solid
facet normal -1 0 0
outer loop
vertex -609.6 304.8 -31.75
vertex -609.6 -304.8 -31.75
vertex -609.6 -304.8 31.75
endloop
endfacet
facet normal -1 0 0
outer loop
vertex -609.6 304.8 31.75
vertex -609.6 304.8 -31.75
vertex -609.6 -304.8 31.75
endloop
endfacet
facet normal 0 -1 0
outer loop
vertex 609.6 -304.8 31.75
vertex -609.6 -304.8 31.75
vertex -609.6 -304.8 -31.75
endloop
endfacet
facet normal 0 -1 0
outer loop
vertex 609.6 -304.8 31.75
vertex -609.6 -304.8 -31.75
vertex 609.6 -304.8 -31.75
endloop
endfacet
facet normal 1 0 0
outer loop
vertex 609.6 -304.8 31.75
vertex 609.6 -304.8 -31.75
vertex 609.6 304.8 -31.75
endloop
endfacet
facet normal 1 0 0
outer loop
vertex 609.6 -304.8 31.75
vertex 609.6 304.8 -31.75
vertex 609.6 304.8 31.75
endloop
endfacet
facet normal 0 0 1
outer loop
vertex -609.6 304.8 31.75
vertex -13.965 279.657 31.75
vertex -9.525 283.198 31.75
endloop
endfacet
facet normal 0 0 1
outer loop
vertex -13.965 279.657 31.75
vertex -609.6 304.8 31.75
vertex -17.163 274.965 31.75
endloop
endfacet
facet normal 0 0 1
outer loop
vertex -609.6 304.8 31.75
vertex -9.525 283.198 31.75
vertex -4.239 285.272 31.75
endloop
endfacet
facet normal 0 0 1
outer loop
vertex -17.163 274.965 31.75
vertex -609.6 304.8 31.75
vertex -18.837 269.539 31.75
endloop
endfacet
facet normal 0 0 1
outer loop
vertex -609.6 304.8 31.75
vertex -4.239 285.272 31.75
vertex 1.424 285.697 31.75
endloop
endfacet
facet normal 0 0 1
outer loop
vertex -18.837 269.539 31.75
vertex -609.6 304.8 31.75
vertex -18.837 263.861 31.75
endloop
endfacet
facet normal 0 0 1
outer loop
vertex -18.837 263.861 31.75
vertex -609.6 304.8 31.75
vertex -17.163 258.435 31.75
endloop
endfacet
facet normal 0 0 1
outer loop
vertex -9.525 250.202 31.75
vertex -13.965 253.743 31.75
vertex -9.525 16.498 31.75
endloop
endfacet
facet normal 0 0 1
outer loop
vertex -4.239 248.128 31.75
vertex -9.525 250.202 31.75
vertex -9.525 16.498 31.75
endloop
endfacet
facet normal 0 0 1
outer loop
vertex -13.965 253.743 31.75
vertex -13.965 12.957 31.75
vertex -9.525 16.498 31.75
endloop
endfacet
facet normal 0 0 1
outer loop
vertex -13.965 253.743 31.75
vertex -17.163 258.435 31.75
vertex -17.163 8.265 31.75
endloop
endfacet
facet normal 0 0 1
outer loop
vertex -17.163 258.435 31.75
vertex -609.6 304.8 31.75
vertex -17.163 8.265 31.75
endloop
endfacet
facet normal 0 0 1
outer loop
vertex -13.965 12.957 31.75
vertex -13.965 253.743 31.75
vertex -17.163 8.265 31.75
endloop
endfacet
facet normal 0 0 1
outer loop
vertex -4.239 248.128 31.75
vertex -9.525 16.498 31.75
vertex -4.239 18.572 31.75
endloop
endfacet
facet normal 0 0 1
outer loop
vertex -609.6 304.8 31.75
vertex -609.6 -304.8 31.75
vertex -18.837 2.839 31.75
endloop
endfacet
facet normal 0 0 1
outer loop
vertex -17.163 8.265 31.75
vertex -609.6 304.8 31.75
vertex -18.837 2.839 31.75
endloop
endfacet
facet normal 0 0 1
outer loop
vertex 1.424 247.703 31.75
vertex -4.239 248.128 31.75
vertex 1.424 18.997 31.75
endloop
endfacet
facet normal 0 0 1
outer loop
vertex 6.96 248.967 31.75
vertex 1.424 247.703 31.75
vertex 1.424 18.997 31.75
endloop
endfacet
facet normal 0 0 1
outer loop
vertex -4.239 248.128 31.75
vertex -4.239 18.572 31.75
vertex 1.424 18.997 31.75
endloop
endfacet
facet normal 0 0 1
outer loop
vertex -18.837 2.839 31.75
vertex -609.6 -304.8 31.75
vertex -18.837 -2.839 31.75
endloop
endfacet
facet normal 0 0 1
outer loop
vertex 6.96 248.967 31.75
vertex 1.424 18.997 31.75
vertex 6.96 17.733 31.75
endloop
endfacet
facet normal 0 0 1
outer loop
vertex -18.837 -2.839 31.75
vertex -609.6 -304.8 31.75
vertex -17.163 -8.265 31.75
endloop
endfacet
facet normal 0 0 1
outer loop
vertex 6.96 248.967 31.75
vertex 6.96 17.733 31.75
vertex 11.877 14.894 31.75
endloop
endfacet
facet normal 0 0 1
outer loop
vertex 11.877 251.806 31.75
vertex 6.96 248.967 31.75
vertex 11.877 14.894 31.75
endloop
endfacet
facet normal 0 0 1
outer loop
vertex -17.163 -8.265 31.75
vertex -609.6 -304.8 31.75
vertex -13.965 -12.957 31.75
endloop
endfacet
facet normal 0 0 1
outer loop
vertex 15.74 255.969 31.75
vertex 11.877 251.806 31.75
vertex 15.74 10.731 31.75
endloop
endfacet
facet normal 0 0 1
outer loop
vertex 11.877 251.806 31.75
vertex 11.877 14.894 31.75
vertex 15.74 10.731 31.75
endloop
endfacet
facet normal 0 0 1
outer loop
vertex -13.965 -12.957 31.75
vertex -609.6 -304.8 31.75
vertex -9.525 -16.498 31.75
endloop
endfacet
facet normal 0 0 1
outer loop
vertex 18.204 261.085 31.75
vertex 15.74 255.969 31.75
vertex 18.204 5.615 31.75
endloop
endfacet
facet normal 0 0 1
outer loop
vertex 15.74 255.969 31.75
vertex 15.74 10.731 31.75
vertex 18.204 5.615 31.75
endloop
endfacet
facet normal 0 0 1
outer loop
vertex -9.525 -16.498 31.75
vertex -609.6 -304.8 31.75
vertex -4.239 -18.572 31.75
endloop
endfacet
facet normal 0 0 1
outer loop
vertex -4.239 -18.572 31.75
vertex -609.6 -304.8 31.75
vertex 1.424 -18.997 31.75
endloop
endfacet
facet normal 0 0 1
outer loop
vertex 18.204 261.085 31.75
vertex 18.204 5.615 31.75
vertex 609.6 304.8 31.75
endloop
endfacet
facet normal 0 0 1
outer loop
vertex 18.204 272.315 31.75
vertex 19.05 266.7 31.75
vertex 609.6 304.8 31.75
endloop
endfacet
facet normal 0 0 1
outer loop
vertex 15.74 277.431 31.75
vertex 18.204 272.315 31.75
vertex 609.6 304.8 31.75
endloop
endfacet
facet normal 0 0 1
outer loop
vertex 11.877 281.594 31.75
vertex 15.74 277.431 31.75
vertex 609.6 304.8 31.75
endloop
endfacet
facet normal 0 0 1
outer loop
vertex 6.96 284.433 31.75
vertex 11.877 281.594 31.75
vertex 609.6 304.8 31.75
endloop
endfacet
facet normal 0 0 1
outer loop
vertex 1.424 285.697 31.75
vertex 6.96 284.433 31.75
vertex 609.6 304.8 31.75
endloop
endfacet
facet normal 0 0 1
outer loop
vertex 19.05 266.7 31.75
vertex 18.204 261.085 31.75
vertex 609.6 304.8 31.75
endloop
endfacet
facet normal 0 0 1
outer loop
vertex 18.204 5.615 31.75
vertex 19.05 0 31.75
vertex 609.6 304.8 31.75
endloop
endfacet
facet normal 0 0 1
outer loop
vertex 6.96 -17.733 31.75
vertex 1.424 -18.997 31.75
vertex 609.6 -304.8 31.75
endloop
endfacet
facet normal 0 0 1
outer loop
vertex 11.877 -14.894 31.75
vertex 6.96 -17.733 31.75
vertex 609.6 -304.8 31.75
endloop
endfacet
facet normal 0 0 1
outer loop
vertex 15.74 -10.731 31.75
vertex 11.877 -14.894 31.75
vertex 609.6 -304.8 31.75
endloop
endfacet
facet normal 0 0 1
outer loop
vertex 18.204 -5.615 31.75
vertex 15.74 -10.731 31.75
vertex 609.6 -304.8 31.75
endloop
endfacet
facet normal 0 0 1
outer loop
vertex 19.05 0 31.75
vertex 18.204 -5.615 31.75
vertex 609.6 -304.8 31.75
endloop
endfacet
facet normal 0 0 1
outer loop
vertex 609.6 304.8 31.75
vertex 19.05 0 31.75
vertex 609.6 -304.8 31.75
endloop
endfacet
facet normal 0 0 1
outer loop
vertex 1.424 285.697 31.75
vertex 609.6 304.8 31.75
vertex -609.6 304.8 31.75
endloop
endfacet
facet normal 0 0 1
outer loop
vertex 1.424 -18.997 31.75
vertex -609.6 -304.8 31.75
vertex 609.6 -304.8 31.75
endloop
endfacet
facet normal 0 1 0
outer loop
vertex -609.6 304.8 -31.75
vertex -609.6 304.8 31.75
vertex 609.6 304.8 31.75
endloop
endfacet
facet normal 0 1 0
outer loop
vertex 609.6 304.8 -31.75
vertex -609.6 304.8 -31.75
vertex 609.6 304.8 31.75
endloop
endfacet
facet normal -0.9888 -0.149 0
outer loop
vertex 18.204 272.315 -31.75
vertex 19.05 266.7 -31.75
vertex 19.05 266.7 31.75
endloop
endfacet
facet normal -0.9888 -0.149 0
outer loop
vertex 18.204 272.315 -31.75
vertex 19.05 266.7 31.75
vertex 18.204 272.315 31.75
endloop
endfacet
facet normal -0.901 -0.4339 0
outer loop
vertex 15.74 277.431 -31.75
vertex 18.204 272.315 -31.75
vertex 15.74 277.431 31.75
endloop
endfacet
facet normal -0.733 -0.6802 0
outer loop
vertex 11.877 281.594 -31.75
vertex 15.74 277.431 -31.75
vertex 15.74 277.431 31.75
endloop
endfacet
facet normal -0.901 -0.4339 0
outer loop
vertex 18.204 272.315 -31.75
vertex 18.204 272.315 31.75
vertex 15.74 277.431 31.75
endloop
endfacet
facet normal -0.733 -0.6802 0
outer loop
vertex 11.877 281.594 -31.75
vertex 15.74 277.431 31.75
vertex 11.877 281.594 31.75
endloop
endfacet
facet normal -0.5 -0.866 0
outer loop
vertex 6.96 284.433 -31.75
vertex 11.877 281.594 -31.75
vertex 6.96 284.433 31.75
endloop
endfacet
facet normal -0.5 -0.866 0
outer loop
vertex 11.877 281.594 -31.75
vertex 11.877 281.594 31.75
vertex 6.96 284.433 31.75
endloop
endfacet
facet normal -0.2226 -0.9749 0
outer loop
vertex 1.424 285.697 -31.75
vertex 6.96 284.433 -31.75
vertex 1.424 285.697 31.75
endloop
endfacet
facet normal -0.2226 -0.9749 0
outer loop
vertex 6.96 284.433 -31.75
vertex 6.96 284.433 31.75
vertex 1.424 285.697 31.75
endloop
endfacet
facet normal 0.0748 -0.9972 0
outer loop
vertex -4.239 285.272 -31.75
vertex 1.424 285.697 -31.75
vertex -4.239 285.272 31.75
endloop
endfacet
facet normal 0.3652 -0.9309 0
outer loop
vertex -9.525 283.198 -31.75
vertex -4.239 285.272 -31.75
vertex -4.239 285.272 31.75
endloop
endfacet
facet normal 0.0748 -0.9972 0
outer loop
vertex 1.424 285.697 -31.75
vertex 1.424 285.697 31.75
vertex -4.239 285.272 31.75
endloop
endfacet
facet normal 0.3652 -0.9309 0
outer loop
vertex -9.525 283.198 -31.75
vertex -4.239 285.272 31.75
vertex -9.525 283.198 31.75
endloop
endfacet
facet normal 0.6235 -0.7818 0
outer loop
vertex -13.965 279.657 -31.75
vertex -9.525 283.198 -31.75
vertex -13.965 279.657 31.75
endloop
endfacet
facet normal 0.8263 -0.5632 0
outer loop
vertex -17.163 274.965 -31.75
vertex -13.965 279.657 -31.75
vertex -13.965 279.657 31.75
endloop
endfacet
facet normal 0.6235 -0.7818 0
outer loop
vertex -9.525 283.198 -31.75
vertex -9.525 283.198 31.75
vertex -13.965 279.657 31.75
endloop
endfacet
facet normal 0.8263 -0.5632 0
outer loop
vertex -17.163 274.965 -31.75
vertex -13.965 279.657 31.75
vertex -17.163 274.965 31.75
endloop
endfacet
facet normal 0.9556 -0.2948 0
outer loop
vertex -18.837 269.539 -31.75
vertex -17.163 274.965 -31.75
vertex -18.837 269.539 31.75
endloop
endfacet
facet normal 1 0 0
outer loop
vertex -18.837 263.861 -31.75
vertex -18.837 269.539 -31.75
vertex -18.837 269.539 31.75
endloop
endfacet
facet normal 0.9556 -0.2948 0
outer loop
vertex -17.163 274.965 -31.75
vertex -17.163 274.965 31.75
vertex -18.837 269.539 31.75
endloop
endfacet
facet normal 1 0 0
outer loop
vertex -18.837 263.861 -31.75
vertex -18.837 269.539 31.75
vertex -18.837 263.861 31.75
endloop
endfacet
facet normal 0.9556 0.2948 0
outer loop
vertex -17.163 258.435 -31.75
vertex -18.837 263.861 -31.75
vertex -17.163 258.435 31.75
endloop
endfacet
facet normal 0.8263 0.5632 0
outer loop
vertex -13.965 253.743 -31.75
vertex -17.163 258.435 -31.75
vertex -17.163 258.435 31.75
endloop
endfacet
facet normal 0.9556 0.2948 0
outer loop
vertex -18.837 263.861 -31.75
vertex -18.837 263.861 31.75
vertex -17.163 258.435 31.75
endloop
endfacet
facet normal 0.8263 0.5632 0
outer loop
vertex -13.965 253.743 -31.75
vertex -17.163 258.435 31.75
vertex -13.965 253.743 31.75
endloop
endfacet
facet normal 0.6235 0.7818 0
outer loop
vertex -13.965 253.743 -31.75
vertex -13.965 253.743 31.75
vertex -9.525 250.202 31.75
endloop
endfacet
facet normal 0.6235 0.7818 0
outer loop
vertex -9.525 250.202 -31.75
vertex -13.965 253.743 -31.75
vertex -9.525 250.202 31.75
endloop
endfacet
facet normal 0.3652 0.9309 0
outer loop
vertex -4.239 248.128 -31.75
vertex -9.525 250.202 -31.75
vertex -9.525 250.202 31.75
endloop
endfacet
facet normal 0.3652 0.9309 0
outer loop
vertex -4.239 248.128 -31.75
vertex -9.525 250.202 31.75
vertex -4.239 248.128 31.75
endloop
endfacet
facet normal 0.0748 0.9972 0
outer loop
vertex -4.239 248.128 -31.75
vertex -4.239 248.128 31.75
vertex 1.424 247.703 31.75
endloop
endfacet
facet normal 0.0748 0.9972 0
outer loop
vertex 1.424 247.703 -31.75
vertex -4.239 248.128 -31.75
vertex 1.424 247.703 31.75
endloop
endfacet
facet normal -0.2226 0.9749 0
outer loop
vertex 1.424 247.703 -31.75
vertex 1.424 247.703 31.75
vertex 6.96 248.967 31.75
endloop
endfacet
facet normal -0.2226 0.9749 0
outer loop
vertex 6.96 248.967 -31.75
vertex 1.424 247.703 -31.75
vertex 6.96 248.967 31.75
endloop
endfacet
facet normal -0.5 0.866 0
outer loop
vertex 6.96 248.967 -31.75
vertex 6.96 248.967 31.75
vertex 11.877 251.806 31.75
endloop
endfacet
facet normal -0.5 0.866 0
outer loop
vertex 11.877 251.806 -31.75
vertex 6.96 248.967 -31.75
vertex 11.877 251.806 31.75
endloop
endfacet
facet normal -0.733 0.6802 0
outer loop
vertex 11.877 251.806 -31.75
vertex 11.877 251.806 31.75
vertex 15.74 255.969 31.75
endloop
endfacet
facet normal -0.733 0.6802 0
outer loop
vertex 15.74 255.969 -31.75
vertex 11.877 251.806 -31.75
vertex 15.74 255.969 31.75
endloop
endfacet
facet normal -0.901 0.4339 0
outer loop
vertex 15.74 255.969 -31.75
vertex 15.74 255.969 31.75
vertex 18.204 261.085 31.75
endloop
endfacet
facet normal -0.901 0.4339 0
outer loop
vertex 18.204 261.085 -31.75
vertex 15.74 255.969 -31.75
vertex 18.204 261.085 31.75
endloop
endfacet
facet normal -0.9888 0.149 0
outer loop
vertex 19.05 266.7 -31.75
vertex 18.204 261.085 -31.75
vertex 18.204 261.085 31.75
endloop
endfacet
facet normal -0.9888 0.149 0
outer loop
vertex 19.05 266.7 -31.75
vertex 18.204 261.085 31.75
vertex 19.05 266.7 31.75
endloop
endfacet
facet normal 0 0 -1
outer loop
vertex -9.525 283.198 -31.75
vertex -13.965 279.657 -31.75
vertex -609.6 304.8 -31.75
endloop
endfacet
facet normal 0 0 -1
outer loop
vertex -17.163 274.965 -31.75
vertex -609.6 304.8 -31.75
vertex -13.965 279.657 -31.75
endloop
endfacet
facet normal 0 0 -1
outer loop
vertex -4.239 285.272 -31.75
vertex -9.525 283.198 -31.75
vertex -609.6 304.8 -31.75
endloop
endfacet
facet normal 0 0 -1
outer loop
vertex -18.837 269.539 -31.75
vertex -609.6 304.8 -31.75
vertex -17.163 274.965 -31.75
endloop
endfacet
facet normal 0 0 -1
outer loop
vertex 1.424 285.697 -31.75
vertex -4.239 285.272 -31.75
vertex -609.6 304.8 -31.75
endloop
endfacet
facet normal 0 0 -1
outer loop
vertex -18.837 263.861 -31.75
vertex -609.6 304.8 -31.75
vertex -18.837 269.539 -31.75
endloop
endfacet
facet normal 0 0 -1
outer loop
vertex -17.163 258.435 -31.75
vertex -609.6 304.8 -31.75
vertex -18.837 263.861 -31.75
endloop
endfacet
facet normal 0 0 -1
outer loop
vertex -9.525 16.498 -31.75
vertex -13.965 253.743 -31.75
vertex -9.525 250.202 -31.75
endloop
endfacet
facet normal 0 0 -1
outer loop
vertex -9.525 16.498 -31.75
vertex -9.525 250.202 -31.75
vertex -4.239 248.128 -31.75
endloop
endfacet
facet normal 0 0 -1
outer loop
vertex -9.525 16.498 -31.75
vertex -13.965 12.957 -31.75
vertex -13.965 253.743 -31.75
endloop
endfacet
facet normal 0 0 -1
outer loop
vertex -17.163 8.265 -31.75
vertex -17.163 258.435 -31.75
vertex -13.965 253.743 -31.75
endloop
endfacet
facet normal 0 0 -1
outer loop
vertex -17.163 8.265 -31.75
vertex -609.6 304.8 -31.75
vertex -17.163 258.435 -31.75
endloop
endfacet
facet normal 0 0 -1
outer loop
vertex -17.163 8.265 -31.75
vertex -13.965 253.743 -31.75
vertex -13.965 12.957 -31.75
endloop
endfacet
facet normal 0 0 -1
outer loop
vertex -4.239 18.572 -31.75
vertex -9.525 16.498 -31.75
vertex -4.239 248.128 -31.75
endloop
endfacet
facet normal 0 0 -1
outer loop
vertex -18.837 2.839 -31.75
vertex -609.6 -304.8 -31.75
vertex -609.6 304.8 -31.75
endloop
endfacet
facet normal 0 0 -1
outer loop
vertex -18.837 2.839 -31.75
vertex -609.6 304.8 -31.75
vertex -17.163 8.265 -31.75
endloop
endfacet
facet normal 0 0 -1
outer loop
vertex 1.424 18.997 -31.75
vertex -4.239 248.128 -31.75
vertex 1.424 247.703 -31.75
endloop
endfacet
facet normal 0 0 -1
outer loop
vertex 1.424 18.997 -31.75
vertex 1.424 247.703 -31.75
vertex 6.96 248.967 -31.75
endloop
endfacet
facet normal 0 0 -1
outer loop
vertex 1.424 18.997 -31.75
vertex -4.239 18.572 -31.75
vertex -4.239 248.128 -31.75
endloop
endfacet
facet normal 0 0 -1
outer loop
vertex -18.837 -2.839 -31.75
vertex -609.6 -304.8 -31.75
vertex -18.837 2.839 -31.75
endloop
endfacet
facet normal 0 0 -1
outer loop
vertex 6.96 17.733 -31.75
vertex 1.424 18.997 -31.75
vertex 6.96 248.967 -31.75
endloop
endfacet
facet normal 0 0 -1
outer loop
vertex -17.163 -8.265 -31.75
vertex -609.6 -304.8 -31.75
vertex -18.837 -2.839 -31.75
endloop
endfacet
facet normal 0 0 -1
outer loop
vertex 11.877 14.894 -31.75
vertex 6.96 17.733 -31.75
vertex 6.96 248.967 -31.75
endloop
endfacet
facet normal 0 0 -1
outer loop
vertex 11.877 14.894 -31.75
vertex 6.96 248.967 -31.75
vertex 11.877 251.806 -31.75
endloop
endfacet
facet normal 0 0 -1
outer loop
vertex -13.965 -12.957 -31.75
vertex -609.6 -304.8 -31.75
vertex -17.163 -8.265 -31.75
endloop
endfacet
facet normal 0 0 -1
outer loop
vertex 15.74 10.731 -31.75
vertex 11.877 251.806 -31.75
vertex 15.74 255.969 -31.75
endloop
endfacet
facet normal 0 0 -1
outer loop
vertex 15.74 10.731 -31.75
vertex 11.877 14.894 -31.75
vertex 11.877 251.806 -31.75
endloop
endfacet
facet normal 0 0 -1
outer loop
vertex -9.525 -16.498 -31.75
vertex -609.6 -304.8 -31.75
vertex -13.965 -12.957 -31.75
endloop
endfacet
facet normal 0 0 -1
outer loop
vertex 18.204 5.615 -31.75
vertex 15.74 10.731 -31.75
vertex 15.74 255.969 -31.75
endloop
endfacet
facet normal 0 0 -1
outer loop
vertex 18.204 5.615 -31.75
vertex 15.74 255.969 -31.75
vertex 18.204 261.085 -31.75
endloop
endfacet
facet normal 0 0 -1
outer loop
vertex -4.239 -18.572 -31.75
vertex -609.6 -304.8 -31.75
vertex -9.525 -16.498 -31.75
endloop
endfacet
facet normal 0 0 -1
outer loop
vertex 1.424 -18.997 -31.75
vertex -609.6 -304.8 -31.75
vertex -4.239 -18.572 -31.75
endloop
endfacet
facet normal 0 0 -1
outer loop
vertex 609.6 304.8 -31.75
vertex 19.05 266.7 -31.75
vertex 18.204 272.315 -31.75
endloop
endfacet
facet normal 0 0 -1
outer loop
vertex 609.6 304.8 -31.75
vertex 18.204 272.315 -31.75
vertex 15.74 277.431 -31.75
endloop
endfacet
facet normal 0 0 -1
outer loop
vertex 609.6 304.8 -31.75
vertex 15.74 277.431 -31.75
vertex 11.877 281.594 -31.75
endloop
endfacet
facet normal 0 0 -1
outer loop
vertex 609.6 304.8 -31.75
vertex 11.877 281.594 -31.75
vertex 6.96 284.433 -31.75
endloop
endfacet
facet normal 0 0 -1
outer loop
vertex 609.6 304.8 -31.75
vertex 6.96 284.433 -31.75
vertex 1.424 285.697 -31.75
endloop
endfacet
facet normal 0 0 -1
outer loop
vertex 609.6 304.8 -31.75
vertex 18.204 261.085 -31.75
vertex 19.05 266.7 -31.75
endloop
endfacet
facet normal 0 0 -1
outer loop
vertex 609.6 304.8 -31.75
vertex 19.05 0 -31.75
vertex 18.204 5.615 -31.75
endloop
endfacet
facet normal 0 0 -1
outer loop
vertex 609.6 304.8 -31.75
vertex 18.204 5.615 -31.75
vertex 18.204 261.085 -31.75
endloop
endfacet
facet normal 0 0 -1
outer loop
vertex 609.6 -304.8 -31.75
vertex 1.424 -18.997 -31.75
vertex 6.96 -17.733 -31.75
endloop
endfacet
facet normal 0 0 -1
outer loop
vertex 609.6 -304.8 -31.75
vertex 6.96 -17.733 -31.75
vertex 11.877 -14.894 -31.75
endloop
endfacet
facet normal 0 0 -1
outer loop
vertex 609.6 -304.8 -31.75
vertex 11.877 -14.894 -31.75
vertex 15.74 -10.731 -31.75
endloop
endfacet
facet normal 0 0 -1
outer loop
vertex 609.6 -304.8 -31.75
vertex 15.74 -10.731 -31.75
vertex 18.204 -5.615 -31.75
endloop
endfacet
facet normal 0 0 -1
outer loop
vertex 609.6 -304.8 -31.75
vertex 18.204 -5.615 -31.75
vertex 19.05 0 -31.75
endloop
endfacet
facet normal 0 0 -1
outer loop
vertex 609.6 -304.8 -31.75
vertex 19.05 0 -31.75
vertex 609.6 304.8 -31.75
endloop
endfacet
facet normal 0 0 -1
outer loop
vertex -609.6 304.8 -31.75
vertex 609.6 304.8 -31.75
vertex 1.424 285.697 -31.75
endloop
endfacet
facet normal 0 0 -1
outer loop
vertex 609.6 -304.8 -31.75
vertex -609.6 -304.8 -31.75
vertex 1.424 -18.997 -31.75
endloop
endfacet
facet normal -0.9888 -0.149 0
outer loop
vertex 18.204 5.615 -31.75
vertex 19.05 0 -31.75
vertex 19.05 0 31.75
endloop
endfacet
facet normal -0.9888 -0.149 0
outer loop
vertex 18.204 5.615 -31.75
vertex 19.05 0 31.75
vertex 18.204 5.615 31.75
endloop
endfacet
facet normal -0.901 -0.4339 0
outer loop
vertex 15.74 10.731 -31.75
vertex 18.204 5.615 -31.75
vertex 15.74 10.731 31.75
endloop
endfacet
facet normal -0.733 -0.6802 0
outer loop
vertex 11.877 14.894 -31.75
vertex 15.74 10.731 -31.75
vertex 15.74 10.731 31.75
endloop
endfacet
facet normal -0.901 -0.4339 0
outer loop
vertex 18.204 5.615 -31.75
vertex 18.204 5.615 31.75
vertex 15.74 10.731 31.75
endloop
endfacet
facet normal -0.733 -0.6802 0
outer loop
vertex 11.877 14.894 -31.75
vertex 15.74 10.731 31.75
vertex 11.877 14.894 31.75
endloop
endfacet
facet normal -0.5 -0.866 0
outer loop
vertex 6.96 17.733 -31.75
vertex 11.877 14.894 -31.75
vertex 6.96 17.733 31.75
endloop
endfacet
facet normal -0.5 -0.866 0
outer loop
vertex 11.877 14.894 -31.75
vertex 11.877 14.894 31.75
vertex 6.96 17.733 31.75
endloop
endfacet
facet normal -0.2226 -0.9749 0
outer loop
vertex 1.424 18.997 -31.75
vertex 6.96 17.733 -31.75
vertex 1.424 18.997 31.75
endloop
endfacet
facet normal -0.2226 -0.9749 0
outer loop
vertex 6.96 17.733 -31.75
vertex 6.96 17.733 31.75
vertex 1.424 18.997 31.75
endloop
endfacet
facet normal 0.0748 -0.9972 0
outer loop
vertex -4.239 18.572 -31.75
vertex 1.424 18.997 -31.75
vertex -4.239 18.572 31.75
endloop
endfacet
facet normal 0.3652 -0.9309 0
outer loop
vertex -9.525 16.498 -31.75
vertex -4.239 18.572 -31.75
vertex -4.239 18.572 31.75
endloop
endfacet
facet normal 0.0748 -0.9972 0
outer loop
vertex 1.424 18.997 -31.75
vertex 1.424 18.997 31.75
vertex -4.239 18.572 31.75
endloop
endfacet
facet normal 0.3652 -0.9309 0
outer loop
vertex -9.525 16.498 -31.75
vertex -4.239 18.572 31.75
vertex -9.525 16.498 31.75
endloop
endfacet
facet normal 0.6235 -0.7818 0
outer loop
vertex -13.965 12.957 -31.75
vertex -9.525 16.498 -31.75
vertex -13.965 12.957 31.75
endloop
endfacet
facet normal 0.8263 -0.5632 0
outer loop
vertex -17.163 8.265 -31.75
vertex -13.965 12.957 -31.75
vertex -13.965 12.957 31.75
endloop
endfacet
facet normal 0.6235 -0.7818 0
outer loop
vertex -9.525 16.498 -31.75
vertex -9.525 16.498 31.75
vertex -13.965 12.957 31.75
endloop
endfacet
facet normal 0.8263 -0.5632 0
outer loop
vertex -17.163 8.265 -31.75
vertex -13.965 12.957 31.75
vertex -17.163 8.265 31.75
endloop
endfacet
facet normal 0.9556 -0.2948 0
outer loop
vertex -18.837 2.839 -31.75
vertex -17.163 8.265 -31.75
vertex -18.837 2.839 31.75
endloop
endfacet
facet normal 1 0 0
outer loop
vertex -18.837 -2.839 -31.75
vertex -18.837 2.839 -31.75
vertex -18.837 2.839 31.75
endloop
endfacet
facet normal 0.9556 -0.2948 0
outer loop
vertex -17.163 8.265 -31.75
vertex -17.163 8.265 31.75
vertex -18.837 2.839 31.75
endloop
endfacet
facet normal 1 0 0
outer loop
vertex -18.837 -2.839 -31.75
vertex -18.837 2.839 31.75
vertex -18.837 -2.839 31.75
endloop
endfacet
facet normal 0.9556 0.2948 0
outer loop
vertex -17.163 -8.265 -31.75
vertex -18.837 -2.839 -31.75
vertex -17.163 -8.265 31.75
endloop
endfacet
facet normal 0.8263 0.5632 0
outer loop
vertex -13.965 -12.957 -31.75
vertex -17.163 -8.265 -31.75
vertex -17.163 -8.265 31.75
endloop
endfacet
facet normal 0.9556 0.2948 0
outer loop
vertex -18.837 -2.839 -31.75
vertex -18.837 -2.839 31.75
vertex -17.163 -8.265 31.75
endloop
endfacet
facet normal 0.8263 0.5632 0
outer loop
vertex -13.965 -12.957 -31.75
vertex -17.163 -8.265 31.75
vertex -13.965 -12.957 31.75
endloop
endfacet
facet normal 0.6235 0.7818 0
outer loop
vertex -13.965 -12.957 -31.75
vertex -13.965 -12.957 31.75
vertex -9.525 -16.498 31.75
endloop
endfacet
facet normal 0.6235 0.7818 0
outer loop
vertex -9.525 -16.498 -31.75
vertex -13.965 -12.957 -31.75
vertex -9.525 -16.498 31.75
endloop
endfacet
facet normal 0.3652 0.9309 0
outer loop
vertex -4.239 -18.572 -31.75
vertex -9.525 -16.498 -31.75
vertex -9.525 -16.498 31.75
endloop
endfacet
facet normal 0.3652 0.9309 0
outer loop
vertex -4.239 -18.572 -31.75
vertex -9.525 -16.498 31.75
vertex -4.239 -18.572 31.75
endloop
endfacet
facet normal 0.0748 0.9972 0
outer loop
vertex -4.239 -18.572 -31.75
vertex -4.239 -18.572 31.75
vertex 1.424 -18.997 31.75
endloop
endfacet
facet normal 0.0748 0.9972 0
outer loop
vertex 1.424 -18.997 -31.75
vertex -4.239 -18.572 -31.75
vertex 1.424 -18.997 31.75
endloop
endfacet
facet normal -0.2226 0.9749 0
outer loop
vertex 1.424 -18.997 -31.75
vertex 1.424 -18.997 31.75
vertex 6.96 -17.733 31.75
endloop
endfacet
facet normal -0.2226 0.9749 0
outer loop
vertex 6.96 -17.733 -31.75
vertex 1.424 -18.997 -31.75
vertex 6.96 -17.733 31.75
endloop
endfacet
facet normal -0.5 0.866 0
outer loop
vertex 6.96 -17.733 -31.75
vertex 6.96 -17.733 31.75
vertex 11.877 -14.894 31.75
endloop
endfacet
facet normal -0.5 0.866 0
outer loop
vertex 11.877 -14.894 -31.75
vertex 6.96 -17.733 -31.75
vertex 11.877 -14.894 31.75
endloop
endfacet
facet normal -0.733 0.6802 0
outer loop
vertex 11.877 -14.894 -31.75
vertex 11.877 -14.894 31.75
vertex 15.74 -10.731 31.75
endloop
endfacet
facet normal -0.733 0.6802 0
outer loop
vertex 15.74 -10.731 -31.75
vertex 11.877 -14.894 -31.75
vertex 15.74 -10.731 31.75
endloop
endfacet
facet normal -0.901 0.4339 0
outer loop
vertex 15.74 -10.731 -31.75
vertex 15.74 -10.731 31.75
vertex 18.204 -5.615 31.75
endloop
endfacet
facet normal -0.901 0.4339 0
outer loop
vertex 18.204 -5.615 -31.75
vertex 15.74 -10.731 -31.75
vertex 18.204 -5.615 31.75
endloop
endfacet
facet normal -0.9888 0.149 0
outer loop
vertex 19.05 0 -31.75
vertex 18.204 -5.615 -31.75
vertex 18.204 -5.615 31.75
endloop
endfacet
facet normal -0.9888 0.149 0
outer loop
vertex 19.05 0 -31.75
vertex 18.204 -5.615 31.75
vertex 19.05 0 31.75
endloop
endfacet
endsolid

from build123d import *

# Parameters (mm, degrees)
F0_W     = 1219.2
F0_H     = 63.5
F1_DEPTH = 304.8
F2_R     = 19.05
F3_DEPTH = 63.501
F4_R     = 19.05
F5_DEPTH = 63.501


with BuildPart() as f1:
    # F0 (on Front) → F1 (new body, symmetric)
    with BuildSketch(Plane.XZ):
        Rectangle(F0_W, F0_H)
    extrude(amount=F1_DEPTH, both=True)

    # F2 (on face) → F3 (cut, through all)
    with BuildSketch(Plane.XY.offset(31.75)):
        Circle(F2_R)
    extrude(amount=-F3_DEPTH, mode=Mode.SUBTRACT)

    # F4 (on face) → F5 (cut, through all)
    with BuildSketch(Plane.XY.offset(31.75)):
        with Locations((0, 266.7)):
            Circle(F4_R)
    extrude(amount=-F5_DEPTH, mode=Mode.SUBTRACT)


solid = f1.part
